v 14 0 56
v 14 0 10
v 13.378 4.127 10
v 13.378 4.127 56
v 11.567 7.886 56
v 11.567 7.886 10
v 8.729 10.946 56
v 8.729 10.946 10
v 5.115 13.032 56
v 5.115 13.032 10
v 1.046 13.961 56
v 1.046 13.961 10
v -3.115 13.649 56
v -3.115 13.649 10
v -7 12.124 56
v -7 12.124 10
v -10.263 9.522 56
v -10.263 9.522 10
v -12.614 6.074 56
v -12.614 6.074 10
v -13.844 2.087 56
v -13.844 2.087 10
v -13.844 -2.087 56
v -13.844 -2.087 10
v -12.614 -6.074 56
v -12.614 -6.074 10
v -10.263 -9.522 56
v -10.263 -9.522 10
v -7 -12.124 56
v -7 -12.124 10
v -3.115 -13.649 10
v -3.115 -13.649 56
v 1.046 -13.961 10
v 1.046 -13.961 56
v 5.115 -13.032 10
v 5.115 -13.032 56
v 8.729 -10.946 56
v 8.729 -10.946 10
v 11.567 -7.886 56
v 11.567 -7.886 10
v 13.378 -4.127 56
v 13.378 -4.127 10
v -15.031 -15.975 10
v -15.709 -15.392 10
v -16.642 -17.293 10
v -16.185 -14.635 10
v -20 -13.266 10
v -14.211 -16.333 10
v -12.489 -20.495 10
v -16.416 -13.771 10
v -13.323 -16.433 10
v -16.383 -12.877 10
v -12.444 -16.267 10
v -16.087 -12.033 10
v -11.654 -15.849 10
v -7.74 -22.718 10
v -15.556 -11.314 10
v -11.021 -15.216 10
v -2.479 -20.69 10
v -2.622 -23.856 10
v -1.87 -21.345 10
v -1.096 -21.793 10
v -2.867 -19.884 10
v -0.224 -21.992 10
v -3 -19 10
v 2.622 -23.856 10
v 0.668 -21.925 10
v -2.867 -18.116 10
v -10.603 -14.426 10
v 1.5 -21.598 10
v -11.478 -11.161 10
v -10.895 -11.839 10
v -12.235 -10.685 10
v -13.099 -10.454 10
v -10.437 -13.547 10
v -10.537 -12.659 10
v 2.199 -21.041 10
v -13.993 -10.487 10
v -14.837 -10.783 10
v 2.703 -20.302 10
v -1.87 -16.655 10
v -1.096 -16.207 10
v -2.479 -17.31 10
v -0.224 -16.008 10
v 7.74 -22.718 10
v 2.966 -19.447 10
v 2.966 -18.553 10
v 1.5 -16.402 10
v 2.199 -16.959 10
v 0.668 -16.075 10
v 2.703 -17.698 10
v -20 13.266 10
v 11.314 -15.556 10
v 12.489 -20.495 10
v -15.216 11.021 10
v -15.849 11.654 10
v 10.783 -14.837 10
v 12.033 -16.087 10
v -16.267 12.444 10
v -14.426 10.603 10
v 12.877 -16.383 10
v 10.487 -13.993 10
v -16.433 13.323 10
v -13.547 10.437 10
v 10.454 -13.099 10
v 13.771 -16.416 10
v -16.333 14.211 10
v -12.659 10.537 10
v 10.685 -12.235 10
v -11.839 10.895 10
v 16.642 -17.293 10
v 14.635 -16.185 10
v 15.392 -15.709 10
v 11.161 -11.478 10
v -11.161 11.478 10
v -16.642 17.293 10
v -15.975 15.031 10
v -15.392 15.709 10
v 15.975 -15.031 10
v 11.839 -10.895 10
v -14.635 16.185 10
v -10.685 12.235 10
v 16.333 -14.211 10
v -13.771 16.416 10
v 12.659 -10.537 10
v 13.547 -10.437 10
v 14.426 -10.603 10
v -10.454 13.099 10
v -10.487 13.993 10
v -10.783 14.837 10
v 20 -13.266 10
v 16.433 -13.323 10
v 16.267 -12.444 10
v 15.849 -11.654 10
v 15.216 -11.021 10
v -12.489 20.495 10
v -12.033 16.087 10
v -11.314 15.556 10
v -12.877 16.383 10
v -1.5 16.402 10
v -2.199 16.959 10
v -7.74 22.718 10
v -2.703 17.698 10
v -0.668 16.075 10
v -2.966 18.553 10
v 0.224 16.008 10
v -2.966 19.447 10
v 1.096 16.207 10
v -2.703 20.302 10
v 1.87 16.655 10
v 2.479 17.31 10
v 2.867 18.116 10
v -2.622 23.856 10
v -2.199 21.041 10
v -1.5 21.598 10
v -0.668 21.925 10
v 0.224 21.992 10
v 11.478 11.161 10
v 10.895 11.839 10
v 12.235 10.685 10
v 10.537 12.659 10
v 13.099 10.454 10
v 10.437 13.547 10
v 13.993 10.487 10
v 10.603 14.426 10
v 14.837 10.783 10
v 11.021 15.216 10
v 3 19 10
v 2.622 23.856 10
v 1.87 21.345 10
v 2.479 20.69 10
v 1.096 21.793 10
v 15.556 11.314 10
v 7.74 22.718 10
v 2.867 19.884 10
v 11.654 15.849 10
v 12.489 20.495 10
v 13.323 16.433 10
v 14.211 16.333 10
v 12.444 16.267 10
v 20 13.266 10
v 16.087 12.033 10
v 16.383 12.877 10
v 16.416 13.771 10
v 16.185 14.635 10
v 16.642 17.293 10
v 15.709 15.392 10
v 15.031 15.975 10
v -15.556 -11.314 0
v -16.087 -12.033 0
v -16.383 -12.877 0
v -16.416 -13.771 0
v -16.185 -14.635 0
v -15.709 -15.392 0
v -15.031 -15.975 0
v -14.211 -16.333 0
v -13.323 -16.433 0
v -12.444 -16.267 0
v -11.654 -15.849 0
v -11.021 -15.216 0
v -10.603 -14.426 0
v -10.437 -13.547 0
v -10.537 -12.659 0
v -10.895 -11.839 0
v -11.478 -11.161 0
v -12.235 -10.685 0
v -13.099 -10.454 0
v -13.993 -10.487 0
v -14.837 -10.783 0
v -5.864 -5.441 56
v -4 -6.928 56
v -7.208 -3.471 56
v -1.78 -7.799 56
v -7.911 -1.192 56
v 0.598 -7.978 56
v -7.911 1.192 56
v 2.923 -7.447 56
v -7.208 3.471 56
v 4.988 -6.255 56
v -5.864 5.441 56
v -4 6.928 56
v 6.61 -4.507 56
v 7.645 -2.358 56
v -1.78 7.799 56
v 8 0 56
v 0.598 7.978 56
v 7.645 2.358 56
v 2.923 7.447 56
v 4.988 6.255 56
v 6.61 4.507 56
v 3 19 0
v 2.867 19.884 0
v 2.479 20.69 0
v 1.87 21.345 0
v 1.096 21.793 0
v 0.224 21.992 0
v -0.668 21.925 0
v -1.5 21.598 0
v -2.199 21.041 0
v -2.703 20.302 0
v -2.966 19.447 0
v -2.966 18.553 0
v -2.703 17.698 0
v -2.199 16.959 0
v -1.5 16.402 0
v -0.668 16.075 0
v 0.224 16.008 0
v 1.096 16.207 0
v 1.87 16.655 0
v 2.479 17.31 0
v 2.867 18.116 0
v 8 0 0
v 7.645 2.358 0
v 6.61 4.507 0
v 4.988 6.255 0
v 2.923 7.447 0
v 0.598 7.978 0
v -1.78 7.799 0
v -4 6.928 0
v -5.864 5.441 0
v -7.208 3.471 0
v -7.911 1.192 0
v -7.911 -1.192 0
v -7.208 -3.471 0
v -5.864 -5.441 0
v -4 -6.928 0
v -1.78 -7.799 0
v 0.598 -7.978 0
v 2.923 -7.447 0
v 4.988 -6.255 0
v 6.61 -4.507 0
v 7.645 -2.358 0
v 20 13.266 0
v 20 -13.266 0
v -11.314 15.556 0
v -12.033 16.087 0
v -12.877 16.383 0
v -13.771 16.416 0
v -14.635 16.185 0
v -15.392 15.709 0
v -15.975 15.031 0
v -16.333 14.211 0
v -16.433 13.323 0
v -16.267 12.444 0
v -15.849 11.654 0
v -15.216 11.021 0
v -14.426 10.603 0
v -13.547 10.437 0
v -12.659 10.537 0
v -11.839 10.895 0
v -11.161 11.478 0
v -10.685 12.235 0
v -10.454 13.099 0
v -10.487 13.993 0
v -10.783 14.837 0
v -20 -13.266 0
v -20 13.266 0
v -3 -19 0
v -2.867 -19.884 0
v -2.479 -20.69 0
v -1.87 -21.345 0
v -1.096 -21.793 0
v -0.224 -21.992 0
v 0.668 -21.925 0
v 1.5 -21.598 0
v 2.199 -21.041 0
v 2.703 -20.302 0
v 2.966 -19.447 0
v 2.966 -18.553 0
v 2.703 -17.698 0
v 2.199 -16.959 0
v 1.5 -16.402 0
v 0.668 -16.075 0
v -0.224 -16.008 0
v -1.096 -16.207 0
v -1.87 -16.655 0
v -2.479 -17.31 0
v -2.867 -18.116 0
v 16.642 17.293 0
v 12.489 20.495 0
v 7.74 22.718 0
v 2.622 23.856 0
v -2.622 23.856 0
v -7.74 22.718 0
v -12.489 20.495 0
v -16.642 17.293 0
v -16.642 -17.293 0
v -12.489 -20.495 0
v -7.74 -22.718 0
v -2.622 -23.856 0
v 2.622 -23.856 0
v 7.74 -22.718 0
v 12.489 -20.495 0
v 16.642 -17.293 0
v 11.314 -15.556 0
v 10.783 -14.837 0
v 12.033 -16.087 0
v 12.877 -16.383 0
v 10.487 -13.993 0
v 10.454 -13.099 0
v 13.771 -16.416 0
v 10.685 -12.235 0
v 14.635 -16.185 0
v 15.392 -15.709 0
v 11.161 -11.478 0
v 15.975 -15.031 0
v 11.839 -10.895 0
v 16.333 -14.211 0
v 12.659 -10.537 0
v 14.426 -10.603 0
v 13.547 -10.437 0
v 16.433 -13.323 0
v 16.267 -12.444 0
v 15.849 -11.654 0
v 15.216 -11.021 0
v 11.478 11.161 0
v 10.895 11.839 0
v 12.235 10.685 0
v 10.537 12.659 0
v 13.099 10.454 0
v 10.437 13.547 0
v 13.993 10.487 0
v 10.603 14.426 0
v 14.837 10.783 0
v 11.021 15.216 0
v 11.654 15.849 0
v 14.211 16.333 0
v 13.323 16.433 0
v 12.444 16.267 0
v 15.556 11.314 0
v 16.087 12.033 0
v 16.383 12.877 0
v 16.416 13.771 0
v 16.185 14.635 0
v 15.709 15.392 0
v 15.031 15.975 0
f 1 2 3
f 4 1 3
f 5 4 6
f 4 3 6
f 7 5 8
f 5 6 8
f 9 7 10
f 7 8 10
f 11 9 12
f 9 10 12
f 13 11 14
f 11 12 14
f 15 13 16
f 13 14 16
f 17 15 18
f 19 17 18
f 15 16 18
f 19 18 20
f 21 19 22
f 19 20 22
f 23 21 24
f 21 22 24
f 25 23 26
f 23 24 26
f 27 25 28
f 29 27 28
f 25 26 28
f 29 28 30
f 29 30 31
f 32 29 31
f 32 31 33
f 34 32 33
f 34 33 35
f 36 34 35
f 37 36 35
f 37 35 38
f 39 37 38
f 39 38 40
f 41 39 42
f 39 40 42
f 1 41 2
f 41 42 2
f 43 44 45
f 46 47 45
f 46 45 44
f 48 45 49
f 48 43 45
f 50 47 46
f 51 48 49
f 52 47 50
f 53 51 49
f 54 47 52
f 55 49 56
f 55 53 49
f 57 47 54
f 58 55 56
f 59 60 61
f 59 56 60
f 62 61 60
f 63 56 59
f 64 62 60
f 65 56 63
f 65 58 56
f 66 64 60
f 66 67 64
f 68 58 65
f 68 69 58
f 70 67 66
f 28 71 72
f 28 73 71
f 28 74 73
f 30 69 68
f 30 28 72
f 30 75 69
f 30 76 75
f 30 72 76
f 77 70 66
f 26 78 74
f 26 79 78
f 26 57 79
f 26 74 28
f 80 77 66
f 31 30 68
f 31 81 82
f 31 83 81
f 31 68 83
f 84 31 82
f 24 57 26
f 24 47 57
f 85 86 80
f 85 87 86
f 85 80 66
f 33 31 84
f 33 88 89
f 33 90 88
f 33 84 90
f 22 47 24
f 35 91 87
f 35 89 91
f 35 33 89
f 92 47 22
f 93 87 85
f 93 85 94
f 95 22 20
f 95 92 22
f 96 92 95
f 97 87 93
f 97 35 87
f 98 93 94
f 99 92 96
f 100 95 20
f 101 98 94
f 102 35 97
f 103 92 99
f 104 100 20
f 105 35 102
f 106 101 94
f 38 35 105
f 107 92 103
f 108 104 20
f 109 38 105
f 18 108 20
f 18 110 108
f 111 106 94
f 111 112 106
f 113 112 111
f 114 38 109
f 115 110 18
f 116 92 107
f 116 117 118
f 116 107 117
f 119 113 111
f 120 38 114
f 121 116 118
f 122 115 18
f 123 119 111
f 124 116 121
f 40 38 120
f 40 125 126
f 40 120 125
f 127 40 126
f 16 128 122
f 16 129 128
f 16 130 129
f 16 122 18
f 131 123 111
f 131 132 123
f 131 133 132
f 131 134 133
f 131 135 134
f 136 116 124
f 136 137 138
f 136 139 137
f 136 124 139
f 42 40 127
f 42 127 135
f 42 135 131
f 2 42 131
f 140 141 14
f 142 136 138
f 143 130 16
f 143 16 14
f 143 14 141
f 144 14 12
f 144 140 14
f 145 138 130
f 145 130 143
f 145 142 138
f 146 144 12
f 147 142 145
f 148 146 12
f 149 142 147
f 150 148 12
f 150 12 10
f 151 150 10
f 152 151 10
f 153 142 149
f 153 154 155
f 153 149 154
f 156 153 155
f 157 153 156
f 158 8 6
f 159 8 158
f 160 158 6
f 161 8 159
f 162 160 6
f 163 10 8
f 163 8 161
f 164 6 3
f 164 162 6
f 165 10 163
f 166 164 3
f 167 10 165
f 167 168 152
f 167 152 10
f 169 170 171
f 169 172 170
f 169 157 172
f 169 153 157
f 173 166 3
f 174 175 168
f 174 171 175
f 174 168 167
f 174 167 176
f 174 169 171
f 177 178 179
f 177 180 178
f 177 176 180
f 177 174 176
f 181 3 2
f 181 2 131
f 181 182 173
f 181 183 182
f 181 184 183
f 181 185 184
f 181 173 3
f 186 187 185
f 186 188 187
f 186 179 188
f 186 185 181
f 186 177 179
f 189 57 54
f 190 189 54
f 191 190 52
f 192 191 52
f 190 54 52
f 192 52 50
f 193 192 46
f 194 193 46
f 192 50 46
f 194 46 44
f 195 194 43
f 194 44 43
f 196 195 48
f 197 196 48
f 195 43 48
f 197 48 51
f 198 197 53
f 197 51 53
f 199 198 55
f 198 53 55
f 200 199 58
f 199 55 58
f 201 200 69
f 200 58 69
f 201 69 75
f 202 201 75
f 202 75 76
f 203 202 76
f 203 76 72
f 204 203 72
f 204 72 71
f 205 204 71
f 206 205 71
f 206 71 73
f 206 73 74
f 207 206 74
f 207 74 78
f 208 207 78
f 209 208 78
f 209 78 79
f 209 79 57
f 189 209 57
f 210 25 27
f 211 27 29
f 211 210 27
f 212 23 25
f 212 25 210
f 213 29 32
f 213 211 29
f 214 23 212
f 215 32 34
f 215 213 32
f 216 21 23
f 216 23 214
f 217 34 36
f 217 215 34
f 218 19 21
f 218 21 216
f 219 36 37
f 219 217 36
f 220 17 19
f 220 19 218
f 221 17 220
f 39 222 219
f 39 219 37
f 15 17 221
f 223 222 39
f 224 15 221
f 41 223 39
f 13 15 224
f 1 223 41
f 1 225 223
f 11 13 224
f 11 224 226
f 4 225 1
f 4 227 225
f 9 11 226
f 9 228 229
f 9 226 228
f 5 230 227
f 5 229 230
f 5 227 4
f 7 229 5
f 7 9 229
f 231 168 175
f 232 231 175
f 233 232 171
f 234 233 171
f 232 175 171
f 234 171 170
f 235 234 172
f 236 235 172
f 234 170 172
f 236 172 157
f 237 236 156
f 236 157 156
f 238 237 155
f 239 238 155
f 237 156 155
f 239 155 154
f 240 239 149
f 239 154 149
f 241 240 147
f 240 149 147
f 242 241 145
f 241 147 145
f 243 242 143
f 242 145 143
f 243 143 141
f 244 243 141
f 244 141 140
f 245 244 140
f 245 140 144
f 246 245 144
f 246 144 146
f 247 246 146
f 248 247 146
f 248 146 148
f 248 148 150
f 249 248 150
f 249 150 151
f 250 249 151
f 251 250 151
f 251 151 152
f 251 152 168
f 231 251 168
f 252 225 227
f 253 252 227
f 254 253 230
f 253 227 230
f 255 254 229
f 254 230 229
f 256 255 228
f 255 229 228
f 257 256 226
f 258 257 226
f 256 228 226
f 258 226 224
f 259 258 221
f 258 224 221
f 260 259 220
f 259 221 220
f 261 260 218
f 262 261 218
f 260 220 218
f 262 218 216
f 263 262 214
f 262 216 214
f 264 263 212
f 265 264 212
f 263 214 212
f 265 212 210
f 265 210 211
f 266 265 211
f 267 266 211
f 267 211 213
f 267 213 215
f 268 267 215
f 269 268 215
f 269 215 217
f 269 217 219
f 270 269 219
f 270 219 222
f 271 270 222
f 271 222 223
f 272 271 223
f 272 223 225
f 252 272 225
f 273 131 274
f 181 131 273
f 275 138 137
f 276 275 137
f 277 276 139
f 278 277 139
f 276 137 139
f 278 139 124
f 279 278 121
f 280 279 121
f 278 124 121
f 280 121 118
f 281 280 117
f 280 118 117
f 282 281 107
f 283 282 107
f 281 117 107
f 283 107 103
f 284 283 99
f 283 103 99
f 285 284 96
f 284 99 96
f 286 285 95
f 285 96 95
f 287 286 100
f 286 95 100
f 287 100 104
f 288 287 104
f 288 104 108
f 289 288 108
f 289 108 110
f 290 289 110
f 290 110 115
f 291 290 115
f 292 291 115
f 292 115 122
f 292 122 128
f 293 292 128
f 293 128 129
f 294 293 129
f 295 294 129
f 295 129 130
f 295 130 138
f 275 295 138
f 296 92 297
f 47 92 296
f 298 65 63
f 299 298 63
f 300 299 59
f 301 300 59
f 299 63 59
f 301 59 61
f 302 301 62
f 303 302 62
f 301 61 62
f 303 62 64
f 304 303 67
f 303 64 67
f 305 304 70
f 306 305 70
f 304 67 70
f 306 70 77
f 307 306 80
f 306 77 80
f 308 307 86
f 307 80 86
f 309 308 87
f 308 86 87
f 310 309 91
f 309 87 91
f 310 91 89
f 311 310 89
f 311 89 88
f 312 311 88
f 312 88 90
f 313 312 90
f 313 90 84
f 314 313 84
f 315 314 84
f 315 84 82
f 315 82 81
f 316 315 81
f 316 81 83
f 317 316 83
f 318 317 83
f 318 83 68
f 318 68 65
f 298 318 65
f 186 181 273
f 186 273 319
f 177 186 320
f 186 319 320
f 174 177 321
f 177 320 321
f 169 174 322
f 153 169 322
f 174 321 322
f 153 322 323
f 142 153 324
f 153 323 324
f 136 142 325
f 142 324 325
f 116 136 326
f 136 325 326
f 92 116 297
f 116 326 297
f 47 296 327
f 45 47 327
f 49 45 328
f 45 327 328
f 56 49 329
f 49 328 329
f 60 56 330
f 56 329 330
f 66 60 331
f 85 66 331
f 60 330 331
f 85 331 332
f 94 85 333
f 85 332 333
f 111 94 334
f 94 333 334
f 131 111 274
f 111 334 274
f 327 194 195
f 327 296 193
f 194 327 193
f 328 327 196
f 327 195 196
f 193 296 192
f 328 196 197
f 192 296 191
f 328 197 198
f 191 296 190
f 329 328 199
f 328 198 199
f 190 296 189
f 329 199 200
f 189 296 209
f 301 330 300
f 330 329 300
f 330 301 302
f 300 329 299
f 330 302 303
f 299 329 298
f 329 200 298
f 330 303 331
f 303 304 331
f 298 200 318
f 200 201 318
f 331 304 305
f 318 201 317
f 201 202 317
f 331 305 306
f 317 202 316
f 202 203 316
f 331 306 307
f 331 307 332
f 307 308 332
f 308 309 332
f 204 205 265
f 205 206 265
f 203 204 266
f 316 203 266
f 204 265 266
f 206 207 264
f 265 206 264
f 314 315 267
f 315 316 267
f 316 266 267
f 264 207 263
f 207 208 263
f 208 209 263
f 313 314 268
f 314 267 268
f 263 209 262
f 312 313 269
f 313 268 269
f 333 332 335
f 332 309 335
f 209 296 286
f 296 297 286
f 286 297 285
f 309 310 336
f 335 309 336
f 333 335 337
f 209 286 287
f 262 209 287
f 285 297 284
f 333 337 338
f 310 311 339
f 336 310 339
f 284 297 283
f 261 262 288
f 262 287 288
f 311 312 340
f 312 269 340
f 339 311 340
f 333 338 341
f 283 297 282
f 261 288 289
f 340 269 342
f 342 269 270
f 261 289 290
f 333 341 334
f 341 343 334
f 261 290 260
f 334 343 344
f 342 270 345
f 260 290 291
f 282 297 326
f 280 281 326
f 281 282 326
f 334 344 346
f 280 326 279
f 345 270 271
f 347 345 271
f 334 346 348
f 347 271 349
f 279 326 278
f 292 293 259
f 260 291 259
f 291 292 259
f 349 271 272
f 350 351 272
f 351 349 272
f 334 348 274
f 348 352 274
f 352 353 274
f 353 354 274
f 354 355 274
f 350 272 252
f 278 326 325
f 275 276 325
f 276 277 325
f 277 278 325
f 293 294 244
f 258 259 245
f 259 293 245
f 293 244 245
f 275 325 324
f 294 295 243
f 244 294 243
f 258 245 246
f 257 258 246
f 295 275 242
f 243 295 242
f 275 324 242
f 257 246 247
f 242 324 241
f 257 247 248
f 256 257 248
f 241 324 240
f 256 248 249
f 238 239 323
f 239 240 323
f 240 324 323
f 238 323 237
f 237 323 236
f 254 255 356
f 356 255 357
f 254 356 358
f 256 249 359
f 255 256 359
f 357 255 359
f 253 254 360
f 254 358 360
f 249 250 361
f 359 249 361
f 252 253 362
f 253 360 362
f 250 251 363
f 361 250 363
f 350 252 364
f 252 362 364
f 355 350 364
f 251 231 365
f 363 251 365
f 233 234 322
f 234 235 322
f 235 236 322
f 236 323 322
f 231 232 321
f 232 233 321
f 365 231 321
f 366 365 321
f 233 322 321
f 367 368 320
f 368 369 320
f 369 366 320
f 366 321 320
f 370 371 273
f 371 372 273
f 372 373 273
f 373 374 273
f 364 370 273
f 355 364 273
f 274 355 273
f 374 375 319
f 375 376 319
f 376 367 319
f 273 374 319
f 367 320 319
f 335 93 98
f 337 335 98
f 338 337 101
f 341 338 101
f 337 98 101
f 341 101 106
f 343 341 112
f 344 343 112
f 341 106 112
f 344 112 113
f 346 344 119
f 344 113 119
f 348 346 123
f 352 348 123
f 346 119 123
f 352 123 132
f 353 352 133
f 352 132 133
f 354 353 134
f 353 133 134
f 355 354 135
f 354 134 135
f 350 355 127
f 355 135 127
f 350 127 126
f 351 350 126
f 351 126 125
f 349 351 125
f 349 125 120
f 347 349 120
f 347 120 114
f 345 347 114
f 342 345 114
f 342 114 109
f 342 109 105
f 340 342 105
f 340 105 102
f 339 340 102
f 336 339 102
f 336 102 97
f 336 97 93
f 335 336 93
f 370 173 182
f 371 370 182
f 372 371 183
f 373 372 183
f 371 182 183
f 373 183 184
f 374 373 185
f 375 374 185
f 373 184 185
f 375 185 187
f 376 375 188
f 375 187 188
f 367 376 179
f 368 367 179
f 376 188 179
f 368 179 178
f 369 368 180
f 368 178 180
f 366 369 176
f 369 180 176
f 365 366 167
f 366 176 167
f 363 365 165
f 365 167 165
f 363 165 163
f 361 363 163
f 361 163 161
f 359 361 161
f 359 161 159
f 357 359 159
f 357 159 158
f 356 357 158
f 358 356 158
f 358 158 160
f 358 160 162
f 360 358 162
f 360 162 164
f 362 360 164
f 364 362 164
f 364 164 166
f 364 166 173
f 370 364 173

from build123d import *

# Parameters (mm, degrees)
SKETCH1_R                  = 24
EXTRUDE1_DEPTH             = 10
SKETCH2_R                  = 14
EXTRUDE2_DEPTH             = 46
EXTRUDE3_START             = -10
EXTRUDE3_DEPTH             = 10
F_6_0_6_DIAMETER_HOLE1_D   = 6
CIRPATTERN1_COUNT          = 8
F_25_0_25_DIAMETER_HOLE1_D = 16


# Read off the part's stored shape, not the designer's step: Extrude3
with BuildPart() as part:
    # Sketch1 → Extrude1 (new body)
    with BuildSketch(Plane.XY):
        Circle(SKETCH1_R)
    extrude(amount=EXTRUDE1_DEPTH)

    # Sketch2 → Extrude2 (add)
    with BuildSketch(Plane.XY.offset(10)):
        Circle(SKETCH2_R)
    extrude(amount=EXTRUDE2_DEPTH)

    # Extrude3 outline → Extrude3 (cut)
    with BuildSketch(Plane(origin=(0, 0, 0), x_dir=(-1, 0, 0), z_dir=(0, 0, -1)).offset(EXTRUDE3_START)):
        with BuildLine():
            Line((-20, -13.266499161), (-20, 13.266499161))
            ThreePointArc((-20, 13.266499161), (-24, 0), (-20, -13.266499161))
        make_face()
        with BuildLine():
            ThreePointArc((20, -13.266499161), (24, 0), (20, 13.266499161))
            Line((20, 13.266499161), (20, -13.266499161))
        make_face()
    extrude(amount=EXTRUDE3_DEPTH, mode=Mode.SUBTRACT)

    # Ø6.0 (6) Diameter Hole1 (through all)
    with Locations(Plane(origin=(0, 0, 0), x_dir=(-1, 0, 0), z_dir=(0, 0, -1))):
        with Locations((0, 19)):
            f_6_0_6_diameter_hole1 = Hole(F_6_0_6_DIAMETER_HOLE1_D / 2)

    # CirPattern1: Ø6.0 (6) Diameter Hole1 ×8 about axis, 2 skipped
    cirpattern1_axis = Axis((0, 0, 0), (0, 0, 1))
    add([f_6_0_6_diameter_hole1.rotate(cirpattern1_axis, i * 360 / CIRPATTERN1_COUNT) for i in range(1, CIRPATTERN1_COUNT) if i not in (2, 6)], mode=Mode.SUBTRACT)

    # Ø25.0 (25) Diameter Hole1 (through all)
    with Locations(Plane(origin=(0, 0, 0), x_dir=(-1, 0, 0), z_dir=(0, 0, -1))):
        with Locations((0, 0)):
            Hole(F_25_0_25_DIAMETER_HOLE1_D / 2)


solid = part.part
